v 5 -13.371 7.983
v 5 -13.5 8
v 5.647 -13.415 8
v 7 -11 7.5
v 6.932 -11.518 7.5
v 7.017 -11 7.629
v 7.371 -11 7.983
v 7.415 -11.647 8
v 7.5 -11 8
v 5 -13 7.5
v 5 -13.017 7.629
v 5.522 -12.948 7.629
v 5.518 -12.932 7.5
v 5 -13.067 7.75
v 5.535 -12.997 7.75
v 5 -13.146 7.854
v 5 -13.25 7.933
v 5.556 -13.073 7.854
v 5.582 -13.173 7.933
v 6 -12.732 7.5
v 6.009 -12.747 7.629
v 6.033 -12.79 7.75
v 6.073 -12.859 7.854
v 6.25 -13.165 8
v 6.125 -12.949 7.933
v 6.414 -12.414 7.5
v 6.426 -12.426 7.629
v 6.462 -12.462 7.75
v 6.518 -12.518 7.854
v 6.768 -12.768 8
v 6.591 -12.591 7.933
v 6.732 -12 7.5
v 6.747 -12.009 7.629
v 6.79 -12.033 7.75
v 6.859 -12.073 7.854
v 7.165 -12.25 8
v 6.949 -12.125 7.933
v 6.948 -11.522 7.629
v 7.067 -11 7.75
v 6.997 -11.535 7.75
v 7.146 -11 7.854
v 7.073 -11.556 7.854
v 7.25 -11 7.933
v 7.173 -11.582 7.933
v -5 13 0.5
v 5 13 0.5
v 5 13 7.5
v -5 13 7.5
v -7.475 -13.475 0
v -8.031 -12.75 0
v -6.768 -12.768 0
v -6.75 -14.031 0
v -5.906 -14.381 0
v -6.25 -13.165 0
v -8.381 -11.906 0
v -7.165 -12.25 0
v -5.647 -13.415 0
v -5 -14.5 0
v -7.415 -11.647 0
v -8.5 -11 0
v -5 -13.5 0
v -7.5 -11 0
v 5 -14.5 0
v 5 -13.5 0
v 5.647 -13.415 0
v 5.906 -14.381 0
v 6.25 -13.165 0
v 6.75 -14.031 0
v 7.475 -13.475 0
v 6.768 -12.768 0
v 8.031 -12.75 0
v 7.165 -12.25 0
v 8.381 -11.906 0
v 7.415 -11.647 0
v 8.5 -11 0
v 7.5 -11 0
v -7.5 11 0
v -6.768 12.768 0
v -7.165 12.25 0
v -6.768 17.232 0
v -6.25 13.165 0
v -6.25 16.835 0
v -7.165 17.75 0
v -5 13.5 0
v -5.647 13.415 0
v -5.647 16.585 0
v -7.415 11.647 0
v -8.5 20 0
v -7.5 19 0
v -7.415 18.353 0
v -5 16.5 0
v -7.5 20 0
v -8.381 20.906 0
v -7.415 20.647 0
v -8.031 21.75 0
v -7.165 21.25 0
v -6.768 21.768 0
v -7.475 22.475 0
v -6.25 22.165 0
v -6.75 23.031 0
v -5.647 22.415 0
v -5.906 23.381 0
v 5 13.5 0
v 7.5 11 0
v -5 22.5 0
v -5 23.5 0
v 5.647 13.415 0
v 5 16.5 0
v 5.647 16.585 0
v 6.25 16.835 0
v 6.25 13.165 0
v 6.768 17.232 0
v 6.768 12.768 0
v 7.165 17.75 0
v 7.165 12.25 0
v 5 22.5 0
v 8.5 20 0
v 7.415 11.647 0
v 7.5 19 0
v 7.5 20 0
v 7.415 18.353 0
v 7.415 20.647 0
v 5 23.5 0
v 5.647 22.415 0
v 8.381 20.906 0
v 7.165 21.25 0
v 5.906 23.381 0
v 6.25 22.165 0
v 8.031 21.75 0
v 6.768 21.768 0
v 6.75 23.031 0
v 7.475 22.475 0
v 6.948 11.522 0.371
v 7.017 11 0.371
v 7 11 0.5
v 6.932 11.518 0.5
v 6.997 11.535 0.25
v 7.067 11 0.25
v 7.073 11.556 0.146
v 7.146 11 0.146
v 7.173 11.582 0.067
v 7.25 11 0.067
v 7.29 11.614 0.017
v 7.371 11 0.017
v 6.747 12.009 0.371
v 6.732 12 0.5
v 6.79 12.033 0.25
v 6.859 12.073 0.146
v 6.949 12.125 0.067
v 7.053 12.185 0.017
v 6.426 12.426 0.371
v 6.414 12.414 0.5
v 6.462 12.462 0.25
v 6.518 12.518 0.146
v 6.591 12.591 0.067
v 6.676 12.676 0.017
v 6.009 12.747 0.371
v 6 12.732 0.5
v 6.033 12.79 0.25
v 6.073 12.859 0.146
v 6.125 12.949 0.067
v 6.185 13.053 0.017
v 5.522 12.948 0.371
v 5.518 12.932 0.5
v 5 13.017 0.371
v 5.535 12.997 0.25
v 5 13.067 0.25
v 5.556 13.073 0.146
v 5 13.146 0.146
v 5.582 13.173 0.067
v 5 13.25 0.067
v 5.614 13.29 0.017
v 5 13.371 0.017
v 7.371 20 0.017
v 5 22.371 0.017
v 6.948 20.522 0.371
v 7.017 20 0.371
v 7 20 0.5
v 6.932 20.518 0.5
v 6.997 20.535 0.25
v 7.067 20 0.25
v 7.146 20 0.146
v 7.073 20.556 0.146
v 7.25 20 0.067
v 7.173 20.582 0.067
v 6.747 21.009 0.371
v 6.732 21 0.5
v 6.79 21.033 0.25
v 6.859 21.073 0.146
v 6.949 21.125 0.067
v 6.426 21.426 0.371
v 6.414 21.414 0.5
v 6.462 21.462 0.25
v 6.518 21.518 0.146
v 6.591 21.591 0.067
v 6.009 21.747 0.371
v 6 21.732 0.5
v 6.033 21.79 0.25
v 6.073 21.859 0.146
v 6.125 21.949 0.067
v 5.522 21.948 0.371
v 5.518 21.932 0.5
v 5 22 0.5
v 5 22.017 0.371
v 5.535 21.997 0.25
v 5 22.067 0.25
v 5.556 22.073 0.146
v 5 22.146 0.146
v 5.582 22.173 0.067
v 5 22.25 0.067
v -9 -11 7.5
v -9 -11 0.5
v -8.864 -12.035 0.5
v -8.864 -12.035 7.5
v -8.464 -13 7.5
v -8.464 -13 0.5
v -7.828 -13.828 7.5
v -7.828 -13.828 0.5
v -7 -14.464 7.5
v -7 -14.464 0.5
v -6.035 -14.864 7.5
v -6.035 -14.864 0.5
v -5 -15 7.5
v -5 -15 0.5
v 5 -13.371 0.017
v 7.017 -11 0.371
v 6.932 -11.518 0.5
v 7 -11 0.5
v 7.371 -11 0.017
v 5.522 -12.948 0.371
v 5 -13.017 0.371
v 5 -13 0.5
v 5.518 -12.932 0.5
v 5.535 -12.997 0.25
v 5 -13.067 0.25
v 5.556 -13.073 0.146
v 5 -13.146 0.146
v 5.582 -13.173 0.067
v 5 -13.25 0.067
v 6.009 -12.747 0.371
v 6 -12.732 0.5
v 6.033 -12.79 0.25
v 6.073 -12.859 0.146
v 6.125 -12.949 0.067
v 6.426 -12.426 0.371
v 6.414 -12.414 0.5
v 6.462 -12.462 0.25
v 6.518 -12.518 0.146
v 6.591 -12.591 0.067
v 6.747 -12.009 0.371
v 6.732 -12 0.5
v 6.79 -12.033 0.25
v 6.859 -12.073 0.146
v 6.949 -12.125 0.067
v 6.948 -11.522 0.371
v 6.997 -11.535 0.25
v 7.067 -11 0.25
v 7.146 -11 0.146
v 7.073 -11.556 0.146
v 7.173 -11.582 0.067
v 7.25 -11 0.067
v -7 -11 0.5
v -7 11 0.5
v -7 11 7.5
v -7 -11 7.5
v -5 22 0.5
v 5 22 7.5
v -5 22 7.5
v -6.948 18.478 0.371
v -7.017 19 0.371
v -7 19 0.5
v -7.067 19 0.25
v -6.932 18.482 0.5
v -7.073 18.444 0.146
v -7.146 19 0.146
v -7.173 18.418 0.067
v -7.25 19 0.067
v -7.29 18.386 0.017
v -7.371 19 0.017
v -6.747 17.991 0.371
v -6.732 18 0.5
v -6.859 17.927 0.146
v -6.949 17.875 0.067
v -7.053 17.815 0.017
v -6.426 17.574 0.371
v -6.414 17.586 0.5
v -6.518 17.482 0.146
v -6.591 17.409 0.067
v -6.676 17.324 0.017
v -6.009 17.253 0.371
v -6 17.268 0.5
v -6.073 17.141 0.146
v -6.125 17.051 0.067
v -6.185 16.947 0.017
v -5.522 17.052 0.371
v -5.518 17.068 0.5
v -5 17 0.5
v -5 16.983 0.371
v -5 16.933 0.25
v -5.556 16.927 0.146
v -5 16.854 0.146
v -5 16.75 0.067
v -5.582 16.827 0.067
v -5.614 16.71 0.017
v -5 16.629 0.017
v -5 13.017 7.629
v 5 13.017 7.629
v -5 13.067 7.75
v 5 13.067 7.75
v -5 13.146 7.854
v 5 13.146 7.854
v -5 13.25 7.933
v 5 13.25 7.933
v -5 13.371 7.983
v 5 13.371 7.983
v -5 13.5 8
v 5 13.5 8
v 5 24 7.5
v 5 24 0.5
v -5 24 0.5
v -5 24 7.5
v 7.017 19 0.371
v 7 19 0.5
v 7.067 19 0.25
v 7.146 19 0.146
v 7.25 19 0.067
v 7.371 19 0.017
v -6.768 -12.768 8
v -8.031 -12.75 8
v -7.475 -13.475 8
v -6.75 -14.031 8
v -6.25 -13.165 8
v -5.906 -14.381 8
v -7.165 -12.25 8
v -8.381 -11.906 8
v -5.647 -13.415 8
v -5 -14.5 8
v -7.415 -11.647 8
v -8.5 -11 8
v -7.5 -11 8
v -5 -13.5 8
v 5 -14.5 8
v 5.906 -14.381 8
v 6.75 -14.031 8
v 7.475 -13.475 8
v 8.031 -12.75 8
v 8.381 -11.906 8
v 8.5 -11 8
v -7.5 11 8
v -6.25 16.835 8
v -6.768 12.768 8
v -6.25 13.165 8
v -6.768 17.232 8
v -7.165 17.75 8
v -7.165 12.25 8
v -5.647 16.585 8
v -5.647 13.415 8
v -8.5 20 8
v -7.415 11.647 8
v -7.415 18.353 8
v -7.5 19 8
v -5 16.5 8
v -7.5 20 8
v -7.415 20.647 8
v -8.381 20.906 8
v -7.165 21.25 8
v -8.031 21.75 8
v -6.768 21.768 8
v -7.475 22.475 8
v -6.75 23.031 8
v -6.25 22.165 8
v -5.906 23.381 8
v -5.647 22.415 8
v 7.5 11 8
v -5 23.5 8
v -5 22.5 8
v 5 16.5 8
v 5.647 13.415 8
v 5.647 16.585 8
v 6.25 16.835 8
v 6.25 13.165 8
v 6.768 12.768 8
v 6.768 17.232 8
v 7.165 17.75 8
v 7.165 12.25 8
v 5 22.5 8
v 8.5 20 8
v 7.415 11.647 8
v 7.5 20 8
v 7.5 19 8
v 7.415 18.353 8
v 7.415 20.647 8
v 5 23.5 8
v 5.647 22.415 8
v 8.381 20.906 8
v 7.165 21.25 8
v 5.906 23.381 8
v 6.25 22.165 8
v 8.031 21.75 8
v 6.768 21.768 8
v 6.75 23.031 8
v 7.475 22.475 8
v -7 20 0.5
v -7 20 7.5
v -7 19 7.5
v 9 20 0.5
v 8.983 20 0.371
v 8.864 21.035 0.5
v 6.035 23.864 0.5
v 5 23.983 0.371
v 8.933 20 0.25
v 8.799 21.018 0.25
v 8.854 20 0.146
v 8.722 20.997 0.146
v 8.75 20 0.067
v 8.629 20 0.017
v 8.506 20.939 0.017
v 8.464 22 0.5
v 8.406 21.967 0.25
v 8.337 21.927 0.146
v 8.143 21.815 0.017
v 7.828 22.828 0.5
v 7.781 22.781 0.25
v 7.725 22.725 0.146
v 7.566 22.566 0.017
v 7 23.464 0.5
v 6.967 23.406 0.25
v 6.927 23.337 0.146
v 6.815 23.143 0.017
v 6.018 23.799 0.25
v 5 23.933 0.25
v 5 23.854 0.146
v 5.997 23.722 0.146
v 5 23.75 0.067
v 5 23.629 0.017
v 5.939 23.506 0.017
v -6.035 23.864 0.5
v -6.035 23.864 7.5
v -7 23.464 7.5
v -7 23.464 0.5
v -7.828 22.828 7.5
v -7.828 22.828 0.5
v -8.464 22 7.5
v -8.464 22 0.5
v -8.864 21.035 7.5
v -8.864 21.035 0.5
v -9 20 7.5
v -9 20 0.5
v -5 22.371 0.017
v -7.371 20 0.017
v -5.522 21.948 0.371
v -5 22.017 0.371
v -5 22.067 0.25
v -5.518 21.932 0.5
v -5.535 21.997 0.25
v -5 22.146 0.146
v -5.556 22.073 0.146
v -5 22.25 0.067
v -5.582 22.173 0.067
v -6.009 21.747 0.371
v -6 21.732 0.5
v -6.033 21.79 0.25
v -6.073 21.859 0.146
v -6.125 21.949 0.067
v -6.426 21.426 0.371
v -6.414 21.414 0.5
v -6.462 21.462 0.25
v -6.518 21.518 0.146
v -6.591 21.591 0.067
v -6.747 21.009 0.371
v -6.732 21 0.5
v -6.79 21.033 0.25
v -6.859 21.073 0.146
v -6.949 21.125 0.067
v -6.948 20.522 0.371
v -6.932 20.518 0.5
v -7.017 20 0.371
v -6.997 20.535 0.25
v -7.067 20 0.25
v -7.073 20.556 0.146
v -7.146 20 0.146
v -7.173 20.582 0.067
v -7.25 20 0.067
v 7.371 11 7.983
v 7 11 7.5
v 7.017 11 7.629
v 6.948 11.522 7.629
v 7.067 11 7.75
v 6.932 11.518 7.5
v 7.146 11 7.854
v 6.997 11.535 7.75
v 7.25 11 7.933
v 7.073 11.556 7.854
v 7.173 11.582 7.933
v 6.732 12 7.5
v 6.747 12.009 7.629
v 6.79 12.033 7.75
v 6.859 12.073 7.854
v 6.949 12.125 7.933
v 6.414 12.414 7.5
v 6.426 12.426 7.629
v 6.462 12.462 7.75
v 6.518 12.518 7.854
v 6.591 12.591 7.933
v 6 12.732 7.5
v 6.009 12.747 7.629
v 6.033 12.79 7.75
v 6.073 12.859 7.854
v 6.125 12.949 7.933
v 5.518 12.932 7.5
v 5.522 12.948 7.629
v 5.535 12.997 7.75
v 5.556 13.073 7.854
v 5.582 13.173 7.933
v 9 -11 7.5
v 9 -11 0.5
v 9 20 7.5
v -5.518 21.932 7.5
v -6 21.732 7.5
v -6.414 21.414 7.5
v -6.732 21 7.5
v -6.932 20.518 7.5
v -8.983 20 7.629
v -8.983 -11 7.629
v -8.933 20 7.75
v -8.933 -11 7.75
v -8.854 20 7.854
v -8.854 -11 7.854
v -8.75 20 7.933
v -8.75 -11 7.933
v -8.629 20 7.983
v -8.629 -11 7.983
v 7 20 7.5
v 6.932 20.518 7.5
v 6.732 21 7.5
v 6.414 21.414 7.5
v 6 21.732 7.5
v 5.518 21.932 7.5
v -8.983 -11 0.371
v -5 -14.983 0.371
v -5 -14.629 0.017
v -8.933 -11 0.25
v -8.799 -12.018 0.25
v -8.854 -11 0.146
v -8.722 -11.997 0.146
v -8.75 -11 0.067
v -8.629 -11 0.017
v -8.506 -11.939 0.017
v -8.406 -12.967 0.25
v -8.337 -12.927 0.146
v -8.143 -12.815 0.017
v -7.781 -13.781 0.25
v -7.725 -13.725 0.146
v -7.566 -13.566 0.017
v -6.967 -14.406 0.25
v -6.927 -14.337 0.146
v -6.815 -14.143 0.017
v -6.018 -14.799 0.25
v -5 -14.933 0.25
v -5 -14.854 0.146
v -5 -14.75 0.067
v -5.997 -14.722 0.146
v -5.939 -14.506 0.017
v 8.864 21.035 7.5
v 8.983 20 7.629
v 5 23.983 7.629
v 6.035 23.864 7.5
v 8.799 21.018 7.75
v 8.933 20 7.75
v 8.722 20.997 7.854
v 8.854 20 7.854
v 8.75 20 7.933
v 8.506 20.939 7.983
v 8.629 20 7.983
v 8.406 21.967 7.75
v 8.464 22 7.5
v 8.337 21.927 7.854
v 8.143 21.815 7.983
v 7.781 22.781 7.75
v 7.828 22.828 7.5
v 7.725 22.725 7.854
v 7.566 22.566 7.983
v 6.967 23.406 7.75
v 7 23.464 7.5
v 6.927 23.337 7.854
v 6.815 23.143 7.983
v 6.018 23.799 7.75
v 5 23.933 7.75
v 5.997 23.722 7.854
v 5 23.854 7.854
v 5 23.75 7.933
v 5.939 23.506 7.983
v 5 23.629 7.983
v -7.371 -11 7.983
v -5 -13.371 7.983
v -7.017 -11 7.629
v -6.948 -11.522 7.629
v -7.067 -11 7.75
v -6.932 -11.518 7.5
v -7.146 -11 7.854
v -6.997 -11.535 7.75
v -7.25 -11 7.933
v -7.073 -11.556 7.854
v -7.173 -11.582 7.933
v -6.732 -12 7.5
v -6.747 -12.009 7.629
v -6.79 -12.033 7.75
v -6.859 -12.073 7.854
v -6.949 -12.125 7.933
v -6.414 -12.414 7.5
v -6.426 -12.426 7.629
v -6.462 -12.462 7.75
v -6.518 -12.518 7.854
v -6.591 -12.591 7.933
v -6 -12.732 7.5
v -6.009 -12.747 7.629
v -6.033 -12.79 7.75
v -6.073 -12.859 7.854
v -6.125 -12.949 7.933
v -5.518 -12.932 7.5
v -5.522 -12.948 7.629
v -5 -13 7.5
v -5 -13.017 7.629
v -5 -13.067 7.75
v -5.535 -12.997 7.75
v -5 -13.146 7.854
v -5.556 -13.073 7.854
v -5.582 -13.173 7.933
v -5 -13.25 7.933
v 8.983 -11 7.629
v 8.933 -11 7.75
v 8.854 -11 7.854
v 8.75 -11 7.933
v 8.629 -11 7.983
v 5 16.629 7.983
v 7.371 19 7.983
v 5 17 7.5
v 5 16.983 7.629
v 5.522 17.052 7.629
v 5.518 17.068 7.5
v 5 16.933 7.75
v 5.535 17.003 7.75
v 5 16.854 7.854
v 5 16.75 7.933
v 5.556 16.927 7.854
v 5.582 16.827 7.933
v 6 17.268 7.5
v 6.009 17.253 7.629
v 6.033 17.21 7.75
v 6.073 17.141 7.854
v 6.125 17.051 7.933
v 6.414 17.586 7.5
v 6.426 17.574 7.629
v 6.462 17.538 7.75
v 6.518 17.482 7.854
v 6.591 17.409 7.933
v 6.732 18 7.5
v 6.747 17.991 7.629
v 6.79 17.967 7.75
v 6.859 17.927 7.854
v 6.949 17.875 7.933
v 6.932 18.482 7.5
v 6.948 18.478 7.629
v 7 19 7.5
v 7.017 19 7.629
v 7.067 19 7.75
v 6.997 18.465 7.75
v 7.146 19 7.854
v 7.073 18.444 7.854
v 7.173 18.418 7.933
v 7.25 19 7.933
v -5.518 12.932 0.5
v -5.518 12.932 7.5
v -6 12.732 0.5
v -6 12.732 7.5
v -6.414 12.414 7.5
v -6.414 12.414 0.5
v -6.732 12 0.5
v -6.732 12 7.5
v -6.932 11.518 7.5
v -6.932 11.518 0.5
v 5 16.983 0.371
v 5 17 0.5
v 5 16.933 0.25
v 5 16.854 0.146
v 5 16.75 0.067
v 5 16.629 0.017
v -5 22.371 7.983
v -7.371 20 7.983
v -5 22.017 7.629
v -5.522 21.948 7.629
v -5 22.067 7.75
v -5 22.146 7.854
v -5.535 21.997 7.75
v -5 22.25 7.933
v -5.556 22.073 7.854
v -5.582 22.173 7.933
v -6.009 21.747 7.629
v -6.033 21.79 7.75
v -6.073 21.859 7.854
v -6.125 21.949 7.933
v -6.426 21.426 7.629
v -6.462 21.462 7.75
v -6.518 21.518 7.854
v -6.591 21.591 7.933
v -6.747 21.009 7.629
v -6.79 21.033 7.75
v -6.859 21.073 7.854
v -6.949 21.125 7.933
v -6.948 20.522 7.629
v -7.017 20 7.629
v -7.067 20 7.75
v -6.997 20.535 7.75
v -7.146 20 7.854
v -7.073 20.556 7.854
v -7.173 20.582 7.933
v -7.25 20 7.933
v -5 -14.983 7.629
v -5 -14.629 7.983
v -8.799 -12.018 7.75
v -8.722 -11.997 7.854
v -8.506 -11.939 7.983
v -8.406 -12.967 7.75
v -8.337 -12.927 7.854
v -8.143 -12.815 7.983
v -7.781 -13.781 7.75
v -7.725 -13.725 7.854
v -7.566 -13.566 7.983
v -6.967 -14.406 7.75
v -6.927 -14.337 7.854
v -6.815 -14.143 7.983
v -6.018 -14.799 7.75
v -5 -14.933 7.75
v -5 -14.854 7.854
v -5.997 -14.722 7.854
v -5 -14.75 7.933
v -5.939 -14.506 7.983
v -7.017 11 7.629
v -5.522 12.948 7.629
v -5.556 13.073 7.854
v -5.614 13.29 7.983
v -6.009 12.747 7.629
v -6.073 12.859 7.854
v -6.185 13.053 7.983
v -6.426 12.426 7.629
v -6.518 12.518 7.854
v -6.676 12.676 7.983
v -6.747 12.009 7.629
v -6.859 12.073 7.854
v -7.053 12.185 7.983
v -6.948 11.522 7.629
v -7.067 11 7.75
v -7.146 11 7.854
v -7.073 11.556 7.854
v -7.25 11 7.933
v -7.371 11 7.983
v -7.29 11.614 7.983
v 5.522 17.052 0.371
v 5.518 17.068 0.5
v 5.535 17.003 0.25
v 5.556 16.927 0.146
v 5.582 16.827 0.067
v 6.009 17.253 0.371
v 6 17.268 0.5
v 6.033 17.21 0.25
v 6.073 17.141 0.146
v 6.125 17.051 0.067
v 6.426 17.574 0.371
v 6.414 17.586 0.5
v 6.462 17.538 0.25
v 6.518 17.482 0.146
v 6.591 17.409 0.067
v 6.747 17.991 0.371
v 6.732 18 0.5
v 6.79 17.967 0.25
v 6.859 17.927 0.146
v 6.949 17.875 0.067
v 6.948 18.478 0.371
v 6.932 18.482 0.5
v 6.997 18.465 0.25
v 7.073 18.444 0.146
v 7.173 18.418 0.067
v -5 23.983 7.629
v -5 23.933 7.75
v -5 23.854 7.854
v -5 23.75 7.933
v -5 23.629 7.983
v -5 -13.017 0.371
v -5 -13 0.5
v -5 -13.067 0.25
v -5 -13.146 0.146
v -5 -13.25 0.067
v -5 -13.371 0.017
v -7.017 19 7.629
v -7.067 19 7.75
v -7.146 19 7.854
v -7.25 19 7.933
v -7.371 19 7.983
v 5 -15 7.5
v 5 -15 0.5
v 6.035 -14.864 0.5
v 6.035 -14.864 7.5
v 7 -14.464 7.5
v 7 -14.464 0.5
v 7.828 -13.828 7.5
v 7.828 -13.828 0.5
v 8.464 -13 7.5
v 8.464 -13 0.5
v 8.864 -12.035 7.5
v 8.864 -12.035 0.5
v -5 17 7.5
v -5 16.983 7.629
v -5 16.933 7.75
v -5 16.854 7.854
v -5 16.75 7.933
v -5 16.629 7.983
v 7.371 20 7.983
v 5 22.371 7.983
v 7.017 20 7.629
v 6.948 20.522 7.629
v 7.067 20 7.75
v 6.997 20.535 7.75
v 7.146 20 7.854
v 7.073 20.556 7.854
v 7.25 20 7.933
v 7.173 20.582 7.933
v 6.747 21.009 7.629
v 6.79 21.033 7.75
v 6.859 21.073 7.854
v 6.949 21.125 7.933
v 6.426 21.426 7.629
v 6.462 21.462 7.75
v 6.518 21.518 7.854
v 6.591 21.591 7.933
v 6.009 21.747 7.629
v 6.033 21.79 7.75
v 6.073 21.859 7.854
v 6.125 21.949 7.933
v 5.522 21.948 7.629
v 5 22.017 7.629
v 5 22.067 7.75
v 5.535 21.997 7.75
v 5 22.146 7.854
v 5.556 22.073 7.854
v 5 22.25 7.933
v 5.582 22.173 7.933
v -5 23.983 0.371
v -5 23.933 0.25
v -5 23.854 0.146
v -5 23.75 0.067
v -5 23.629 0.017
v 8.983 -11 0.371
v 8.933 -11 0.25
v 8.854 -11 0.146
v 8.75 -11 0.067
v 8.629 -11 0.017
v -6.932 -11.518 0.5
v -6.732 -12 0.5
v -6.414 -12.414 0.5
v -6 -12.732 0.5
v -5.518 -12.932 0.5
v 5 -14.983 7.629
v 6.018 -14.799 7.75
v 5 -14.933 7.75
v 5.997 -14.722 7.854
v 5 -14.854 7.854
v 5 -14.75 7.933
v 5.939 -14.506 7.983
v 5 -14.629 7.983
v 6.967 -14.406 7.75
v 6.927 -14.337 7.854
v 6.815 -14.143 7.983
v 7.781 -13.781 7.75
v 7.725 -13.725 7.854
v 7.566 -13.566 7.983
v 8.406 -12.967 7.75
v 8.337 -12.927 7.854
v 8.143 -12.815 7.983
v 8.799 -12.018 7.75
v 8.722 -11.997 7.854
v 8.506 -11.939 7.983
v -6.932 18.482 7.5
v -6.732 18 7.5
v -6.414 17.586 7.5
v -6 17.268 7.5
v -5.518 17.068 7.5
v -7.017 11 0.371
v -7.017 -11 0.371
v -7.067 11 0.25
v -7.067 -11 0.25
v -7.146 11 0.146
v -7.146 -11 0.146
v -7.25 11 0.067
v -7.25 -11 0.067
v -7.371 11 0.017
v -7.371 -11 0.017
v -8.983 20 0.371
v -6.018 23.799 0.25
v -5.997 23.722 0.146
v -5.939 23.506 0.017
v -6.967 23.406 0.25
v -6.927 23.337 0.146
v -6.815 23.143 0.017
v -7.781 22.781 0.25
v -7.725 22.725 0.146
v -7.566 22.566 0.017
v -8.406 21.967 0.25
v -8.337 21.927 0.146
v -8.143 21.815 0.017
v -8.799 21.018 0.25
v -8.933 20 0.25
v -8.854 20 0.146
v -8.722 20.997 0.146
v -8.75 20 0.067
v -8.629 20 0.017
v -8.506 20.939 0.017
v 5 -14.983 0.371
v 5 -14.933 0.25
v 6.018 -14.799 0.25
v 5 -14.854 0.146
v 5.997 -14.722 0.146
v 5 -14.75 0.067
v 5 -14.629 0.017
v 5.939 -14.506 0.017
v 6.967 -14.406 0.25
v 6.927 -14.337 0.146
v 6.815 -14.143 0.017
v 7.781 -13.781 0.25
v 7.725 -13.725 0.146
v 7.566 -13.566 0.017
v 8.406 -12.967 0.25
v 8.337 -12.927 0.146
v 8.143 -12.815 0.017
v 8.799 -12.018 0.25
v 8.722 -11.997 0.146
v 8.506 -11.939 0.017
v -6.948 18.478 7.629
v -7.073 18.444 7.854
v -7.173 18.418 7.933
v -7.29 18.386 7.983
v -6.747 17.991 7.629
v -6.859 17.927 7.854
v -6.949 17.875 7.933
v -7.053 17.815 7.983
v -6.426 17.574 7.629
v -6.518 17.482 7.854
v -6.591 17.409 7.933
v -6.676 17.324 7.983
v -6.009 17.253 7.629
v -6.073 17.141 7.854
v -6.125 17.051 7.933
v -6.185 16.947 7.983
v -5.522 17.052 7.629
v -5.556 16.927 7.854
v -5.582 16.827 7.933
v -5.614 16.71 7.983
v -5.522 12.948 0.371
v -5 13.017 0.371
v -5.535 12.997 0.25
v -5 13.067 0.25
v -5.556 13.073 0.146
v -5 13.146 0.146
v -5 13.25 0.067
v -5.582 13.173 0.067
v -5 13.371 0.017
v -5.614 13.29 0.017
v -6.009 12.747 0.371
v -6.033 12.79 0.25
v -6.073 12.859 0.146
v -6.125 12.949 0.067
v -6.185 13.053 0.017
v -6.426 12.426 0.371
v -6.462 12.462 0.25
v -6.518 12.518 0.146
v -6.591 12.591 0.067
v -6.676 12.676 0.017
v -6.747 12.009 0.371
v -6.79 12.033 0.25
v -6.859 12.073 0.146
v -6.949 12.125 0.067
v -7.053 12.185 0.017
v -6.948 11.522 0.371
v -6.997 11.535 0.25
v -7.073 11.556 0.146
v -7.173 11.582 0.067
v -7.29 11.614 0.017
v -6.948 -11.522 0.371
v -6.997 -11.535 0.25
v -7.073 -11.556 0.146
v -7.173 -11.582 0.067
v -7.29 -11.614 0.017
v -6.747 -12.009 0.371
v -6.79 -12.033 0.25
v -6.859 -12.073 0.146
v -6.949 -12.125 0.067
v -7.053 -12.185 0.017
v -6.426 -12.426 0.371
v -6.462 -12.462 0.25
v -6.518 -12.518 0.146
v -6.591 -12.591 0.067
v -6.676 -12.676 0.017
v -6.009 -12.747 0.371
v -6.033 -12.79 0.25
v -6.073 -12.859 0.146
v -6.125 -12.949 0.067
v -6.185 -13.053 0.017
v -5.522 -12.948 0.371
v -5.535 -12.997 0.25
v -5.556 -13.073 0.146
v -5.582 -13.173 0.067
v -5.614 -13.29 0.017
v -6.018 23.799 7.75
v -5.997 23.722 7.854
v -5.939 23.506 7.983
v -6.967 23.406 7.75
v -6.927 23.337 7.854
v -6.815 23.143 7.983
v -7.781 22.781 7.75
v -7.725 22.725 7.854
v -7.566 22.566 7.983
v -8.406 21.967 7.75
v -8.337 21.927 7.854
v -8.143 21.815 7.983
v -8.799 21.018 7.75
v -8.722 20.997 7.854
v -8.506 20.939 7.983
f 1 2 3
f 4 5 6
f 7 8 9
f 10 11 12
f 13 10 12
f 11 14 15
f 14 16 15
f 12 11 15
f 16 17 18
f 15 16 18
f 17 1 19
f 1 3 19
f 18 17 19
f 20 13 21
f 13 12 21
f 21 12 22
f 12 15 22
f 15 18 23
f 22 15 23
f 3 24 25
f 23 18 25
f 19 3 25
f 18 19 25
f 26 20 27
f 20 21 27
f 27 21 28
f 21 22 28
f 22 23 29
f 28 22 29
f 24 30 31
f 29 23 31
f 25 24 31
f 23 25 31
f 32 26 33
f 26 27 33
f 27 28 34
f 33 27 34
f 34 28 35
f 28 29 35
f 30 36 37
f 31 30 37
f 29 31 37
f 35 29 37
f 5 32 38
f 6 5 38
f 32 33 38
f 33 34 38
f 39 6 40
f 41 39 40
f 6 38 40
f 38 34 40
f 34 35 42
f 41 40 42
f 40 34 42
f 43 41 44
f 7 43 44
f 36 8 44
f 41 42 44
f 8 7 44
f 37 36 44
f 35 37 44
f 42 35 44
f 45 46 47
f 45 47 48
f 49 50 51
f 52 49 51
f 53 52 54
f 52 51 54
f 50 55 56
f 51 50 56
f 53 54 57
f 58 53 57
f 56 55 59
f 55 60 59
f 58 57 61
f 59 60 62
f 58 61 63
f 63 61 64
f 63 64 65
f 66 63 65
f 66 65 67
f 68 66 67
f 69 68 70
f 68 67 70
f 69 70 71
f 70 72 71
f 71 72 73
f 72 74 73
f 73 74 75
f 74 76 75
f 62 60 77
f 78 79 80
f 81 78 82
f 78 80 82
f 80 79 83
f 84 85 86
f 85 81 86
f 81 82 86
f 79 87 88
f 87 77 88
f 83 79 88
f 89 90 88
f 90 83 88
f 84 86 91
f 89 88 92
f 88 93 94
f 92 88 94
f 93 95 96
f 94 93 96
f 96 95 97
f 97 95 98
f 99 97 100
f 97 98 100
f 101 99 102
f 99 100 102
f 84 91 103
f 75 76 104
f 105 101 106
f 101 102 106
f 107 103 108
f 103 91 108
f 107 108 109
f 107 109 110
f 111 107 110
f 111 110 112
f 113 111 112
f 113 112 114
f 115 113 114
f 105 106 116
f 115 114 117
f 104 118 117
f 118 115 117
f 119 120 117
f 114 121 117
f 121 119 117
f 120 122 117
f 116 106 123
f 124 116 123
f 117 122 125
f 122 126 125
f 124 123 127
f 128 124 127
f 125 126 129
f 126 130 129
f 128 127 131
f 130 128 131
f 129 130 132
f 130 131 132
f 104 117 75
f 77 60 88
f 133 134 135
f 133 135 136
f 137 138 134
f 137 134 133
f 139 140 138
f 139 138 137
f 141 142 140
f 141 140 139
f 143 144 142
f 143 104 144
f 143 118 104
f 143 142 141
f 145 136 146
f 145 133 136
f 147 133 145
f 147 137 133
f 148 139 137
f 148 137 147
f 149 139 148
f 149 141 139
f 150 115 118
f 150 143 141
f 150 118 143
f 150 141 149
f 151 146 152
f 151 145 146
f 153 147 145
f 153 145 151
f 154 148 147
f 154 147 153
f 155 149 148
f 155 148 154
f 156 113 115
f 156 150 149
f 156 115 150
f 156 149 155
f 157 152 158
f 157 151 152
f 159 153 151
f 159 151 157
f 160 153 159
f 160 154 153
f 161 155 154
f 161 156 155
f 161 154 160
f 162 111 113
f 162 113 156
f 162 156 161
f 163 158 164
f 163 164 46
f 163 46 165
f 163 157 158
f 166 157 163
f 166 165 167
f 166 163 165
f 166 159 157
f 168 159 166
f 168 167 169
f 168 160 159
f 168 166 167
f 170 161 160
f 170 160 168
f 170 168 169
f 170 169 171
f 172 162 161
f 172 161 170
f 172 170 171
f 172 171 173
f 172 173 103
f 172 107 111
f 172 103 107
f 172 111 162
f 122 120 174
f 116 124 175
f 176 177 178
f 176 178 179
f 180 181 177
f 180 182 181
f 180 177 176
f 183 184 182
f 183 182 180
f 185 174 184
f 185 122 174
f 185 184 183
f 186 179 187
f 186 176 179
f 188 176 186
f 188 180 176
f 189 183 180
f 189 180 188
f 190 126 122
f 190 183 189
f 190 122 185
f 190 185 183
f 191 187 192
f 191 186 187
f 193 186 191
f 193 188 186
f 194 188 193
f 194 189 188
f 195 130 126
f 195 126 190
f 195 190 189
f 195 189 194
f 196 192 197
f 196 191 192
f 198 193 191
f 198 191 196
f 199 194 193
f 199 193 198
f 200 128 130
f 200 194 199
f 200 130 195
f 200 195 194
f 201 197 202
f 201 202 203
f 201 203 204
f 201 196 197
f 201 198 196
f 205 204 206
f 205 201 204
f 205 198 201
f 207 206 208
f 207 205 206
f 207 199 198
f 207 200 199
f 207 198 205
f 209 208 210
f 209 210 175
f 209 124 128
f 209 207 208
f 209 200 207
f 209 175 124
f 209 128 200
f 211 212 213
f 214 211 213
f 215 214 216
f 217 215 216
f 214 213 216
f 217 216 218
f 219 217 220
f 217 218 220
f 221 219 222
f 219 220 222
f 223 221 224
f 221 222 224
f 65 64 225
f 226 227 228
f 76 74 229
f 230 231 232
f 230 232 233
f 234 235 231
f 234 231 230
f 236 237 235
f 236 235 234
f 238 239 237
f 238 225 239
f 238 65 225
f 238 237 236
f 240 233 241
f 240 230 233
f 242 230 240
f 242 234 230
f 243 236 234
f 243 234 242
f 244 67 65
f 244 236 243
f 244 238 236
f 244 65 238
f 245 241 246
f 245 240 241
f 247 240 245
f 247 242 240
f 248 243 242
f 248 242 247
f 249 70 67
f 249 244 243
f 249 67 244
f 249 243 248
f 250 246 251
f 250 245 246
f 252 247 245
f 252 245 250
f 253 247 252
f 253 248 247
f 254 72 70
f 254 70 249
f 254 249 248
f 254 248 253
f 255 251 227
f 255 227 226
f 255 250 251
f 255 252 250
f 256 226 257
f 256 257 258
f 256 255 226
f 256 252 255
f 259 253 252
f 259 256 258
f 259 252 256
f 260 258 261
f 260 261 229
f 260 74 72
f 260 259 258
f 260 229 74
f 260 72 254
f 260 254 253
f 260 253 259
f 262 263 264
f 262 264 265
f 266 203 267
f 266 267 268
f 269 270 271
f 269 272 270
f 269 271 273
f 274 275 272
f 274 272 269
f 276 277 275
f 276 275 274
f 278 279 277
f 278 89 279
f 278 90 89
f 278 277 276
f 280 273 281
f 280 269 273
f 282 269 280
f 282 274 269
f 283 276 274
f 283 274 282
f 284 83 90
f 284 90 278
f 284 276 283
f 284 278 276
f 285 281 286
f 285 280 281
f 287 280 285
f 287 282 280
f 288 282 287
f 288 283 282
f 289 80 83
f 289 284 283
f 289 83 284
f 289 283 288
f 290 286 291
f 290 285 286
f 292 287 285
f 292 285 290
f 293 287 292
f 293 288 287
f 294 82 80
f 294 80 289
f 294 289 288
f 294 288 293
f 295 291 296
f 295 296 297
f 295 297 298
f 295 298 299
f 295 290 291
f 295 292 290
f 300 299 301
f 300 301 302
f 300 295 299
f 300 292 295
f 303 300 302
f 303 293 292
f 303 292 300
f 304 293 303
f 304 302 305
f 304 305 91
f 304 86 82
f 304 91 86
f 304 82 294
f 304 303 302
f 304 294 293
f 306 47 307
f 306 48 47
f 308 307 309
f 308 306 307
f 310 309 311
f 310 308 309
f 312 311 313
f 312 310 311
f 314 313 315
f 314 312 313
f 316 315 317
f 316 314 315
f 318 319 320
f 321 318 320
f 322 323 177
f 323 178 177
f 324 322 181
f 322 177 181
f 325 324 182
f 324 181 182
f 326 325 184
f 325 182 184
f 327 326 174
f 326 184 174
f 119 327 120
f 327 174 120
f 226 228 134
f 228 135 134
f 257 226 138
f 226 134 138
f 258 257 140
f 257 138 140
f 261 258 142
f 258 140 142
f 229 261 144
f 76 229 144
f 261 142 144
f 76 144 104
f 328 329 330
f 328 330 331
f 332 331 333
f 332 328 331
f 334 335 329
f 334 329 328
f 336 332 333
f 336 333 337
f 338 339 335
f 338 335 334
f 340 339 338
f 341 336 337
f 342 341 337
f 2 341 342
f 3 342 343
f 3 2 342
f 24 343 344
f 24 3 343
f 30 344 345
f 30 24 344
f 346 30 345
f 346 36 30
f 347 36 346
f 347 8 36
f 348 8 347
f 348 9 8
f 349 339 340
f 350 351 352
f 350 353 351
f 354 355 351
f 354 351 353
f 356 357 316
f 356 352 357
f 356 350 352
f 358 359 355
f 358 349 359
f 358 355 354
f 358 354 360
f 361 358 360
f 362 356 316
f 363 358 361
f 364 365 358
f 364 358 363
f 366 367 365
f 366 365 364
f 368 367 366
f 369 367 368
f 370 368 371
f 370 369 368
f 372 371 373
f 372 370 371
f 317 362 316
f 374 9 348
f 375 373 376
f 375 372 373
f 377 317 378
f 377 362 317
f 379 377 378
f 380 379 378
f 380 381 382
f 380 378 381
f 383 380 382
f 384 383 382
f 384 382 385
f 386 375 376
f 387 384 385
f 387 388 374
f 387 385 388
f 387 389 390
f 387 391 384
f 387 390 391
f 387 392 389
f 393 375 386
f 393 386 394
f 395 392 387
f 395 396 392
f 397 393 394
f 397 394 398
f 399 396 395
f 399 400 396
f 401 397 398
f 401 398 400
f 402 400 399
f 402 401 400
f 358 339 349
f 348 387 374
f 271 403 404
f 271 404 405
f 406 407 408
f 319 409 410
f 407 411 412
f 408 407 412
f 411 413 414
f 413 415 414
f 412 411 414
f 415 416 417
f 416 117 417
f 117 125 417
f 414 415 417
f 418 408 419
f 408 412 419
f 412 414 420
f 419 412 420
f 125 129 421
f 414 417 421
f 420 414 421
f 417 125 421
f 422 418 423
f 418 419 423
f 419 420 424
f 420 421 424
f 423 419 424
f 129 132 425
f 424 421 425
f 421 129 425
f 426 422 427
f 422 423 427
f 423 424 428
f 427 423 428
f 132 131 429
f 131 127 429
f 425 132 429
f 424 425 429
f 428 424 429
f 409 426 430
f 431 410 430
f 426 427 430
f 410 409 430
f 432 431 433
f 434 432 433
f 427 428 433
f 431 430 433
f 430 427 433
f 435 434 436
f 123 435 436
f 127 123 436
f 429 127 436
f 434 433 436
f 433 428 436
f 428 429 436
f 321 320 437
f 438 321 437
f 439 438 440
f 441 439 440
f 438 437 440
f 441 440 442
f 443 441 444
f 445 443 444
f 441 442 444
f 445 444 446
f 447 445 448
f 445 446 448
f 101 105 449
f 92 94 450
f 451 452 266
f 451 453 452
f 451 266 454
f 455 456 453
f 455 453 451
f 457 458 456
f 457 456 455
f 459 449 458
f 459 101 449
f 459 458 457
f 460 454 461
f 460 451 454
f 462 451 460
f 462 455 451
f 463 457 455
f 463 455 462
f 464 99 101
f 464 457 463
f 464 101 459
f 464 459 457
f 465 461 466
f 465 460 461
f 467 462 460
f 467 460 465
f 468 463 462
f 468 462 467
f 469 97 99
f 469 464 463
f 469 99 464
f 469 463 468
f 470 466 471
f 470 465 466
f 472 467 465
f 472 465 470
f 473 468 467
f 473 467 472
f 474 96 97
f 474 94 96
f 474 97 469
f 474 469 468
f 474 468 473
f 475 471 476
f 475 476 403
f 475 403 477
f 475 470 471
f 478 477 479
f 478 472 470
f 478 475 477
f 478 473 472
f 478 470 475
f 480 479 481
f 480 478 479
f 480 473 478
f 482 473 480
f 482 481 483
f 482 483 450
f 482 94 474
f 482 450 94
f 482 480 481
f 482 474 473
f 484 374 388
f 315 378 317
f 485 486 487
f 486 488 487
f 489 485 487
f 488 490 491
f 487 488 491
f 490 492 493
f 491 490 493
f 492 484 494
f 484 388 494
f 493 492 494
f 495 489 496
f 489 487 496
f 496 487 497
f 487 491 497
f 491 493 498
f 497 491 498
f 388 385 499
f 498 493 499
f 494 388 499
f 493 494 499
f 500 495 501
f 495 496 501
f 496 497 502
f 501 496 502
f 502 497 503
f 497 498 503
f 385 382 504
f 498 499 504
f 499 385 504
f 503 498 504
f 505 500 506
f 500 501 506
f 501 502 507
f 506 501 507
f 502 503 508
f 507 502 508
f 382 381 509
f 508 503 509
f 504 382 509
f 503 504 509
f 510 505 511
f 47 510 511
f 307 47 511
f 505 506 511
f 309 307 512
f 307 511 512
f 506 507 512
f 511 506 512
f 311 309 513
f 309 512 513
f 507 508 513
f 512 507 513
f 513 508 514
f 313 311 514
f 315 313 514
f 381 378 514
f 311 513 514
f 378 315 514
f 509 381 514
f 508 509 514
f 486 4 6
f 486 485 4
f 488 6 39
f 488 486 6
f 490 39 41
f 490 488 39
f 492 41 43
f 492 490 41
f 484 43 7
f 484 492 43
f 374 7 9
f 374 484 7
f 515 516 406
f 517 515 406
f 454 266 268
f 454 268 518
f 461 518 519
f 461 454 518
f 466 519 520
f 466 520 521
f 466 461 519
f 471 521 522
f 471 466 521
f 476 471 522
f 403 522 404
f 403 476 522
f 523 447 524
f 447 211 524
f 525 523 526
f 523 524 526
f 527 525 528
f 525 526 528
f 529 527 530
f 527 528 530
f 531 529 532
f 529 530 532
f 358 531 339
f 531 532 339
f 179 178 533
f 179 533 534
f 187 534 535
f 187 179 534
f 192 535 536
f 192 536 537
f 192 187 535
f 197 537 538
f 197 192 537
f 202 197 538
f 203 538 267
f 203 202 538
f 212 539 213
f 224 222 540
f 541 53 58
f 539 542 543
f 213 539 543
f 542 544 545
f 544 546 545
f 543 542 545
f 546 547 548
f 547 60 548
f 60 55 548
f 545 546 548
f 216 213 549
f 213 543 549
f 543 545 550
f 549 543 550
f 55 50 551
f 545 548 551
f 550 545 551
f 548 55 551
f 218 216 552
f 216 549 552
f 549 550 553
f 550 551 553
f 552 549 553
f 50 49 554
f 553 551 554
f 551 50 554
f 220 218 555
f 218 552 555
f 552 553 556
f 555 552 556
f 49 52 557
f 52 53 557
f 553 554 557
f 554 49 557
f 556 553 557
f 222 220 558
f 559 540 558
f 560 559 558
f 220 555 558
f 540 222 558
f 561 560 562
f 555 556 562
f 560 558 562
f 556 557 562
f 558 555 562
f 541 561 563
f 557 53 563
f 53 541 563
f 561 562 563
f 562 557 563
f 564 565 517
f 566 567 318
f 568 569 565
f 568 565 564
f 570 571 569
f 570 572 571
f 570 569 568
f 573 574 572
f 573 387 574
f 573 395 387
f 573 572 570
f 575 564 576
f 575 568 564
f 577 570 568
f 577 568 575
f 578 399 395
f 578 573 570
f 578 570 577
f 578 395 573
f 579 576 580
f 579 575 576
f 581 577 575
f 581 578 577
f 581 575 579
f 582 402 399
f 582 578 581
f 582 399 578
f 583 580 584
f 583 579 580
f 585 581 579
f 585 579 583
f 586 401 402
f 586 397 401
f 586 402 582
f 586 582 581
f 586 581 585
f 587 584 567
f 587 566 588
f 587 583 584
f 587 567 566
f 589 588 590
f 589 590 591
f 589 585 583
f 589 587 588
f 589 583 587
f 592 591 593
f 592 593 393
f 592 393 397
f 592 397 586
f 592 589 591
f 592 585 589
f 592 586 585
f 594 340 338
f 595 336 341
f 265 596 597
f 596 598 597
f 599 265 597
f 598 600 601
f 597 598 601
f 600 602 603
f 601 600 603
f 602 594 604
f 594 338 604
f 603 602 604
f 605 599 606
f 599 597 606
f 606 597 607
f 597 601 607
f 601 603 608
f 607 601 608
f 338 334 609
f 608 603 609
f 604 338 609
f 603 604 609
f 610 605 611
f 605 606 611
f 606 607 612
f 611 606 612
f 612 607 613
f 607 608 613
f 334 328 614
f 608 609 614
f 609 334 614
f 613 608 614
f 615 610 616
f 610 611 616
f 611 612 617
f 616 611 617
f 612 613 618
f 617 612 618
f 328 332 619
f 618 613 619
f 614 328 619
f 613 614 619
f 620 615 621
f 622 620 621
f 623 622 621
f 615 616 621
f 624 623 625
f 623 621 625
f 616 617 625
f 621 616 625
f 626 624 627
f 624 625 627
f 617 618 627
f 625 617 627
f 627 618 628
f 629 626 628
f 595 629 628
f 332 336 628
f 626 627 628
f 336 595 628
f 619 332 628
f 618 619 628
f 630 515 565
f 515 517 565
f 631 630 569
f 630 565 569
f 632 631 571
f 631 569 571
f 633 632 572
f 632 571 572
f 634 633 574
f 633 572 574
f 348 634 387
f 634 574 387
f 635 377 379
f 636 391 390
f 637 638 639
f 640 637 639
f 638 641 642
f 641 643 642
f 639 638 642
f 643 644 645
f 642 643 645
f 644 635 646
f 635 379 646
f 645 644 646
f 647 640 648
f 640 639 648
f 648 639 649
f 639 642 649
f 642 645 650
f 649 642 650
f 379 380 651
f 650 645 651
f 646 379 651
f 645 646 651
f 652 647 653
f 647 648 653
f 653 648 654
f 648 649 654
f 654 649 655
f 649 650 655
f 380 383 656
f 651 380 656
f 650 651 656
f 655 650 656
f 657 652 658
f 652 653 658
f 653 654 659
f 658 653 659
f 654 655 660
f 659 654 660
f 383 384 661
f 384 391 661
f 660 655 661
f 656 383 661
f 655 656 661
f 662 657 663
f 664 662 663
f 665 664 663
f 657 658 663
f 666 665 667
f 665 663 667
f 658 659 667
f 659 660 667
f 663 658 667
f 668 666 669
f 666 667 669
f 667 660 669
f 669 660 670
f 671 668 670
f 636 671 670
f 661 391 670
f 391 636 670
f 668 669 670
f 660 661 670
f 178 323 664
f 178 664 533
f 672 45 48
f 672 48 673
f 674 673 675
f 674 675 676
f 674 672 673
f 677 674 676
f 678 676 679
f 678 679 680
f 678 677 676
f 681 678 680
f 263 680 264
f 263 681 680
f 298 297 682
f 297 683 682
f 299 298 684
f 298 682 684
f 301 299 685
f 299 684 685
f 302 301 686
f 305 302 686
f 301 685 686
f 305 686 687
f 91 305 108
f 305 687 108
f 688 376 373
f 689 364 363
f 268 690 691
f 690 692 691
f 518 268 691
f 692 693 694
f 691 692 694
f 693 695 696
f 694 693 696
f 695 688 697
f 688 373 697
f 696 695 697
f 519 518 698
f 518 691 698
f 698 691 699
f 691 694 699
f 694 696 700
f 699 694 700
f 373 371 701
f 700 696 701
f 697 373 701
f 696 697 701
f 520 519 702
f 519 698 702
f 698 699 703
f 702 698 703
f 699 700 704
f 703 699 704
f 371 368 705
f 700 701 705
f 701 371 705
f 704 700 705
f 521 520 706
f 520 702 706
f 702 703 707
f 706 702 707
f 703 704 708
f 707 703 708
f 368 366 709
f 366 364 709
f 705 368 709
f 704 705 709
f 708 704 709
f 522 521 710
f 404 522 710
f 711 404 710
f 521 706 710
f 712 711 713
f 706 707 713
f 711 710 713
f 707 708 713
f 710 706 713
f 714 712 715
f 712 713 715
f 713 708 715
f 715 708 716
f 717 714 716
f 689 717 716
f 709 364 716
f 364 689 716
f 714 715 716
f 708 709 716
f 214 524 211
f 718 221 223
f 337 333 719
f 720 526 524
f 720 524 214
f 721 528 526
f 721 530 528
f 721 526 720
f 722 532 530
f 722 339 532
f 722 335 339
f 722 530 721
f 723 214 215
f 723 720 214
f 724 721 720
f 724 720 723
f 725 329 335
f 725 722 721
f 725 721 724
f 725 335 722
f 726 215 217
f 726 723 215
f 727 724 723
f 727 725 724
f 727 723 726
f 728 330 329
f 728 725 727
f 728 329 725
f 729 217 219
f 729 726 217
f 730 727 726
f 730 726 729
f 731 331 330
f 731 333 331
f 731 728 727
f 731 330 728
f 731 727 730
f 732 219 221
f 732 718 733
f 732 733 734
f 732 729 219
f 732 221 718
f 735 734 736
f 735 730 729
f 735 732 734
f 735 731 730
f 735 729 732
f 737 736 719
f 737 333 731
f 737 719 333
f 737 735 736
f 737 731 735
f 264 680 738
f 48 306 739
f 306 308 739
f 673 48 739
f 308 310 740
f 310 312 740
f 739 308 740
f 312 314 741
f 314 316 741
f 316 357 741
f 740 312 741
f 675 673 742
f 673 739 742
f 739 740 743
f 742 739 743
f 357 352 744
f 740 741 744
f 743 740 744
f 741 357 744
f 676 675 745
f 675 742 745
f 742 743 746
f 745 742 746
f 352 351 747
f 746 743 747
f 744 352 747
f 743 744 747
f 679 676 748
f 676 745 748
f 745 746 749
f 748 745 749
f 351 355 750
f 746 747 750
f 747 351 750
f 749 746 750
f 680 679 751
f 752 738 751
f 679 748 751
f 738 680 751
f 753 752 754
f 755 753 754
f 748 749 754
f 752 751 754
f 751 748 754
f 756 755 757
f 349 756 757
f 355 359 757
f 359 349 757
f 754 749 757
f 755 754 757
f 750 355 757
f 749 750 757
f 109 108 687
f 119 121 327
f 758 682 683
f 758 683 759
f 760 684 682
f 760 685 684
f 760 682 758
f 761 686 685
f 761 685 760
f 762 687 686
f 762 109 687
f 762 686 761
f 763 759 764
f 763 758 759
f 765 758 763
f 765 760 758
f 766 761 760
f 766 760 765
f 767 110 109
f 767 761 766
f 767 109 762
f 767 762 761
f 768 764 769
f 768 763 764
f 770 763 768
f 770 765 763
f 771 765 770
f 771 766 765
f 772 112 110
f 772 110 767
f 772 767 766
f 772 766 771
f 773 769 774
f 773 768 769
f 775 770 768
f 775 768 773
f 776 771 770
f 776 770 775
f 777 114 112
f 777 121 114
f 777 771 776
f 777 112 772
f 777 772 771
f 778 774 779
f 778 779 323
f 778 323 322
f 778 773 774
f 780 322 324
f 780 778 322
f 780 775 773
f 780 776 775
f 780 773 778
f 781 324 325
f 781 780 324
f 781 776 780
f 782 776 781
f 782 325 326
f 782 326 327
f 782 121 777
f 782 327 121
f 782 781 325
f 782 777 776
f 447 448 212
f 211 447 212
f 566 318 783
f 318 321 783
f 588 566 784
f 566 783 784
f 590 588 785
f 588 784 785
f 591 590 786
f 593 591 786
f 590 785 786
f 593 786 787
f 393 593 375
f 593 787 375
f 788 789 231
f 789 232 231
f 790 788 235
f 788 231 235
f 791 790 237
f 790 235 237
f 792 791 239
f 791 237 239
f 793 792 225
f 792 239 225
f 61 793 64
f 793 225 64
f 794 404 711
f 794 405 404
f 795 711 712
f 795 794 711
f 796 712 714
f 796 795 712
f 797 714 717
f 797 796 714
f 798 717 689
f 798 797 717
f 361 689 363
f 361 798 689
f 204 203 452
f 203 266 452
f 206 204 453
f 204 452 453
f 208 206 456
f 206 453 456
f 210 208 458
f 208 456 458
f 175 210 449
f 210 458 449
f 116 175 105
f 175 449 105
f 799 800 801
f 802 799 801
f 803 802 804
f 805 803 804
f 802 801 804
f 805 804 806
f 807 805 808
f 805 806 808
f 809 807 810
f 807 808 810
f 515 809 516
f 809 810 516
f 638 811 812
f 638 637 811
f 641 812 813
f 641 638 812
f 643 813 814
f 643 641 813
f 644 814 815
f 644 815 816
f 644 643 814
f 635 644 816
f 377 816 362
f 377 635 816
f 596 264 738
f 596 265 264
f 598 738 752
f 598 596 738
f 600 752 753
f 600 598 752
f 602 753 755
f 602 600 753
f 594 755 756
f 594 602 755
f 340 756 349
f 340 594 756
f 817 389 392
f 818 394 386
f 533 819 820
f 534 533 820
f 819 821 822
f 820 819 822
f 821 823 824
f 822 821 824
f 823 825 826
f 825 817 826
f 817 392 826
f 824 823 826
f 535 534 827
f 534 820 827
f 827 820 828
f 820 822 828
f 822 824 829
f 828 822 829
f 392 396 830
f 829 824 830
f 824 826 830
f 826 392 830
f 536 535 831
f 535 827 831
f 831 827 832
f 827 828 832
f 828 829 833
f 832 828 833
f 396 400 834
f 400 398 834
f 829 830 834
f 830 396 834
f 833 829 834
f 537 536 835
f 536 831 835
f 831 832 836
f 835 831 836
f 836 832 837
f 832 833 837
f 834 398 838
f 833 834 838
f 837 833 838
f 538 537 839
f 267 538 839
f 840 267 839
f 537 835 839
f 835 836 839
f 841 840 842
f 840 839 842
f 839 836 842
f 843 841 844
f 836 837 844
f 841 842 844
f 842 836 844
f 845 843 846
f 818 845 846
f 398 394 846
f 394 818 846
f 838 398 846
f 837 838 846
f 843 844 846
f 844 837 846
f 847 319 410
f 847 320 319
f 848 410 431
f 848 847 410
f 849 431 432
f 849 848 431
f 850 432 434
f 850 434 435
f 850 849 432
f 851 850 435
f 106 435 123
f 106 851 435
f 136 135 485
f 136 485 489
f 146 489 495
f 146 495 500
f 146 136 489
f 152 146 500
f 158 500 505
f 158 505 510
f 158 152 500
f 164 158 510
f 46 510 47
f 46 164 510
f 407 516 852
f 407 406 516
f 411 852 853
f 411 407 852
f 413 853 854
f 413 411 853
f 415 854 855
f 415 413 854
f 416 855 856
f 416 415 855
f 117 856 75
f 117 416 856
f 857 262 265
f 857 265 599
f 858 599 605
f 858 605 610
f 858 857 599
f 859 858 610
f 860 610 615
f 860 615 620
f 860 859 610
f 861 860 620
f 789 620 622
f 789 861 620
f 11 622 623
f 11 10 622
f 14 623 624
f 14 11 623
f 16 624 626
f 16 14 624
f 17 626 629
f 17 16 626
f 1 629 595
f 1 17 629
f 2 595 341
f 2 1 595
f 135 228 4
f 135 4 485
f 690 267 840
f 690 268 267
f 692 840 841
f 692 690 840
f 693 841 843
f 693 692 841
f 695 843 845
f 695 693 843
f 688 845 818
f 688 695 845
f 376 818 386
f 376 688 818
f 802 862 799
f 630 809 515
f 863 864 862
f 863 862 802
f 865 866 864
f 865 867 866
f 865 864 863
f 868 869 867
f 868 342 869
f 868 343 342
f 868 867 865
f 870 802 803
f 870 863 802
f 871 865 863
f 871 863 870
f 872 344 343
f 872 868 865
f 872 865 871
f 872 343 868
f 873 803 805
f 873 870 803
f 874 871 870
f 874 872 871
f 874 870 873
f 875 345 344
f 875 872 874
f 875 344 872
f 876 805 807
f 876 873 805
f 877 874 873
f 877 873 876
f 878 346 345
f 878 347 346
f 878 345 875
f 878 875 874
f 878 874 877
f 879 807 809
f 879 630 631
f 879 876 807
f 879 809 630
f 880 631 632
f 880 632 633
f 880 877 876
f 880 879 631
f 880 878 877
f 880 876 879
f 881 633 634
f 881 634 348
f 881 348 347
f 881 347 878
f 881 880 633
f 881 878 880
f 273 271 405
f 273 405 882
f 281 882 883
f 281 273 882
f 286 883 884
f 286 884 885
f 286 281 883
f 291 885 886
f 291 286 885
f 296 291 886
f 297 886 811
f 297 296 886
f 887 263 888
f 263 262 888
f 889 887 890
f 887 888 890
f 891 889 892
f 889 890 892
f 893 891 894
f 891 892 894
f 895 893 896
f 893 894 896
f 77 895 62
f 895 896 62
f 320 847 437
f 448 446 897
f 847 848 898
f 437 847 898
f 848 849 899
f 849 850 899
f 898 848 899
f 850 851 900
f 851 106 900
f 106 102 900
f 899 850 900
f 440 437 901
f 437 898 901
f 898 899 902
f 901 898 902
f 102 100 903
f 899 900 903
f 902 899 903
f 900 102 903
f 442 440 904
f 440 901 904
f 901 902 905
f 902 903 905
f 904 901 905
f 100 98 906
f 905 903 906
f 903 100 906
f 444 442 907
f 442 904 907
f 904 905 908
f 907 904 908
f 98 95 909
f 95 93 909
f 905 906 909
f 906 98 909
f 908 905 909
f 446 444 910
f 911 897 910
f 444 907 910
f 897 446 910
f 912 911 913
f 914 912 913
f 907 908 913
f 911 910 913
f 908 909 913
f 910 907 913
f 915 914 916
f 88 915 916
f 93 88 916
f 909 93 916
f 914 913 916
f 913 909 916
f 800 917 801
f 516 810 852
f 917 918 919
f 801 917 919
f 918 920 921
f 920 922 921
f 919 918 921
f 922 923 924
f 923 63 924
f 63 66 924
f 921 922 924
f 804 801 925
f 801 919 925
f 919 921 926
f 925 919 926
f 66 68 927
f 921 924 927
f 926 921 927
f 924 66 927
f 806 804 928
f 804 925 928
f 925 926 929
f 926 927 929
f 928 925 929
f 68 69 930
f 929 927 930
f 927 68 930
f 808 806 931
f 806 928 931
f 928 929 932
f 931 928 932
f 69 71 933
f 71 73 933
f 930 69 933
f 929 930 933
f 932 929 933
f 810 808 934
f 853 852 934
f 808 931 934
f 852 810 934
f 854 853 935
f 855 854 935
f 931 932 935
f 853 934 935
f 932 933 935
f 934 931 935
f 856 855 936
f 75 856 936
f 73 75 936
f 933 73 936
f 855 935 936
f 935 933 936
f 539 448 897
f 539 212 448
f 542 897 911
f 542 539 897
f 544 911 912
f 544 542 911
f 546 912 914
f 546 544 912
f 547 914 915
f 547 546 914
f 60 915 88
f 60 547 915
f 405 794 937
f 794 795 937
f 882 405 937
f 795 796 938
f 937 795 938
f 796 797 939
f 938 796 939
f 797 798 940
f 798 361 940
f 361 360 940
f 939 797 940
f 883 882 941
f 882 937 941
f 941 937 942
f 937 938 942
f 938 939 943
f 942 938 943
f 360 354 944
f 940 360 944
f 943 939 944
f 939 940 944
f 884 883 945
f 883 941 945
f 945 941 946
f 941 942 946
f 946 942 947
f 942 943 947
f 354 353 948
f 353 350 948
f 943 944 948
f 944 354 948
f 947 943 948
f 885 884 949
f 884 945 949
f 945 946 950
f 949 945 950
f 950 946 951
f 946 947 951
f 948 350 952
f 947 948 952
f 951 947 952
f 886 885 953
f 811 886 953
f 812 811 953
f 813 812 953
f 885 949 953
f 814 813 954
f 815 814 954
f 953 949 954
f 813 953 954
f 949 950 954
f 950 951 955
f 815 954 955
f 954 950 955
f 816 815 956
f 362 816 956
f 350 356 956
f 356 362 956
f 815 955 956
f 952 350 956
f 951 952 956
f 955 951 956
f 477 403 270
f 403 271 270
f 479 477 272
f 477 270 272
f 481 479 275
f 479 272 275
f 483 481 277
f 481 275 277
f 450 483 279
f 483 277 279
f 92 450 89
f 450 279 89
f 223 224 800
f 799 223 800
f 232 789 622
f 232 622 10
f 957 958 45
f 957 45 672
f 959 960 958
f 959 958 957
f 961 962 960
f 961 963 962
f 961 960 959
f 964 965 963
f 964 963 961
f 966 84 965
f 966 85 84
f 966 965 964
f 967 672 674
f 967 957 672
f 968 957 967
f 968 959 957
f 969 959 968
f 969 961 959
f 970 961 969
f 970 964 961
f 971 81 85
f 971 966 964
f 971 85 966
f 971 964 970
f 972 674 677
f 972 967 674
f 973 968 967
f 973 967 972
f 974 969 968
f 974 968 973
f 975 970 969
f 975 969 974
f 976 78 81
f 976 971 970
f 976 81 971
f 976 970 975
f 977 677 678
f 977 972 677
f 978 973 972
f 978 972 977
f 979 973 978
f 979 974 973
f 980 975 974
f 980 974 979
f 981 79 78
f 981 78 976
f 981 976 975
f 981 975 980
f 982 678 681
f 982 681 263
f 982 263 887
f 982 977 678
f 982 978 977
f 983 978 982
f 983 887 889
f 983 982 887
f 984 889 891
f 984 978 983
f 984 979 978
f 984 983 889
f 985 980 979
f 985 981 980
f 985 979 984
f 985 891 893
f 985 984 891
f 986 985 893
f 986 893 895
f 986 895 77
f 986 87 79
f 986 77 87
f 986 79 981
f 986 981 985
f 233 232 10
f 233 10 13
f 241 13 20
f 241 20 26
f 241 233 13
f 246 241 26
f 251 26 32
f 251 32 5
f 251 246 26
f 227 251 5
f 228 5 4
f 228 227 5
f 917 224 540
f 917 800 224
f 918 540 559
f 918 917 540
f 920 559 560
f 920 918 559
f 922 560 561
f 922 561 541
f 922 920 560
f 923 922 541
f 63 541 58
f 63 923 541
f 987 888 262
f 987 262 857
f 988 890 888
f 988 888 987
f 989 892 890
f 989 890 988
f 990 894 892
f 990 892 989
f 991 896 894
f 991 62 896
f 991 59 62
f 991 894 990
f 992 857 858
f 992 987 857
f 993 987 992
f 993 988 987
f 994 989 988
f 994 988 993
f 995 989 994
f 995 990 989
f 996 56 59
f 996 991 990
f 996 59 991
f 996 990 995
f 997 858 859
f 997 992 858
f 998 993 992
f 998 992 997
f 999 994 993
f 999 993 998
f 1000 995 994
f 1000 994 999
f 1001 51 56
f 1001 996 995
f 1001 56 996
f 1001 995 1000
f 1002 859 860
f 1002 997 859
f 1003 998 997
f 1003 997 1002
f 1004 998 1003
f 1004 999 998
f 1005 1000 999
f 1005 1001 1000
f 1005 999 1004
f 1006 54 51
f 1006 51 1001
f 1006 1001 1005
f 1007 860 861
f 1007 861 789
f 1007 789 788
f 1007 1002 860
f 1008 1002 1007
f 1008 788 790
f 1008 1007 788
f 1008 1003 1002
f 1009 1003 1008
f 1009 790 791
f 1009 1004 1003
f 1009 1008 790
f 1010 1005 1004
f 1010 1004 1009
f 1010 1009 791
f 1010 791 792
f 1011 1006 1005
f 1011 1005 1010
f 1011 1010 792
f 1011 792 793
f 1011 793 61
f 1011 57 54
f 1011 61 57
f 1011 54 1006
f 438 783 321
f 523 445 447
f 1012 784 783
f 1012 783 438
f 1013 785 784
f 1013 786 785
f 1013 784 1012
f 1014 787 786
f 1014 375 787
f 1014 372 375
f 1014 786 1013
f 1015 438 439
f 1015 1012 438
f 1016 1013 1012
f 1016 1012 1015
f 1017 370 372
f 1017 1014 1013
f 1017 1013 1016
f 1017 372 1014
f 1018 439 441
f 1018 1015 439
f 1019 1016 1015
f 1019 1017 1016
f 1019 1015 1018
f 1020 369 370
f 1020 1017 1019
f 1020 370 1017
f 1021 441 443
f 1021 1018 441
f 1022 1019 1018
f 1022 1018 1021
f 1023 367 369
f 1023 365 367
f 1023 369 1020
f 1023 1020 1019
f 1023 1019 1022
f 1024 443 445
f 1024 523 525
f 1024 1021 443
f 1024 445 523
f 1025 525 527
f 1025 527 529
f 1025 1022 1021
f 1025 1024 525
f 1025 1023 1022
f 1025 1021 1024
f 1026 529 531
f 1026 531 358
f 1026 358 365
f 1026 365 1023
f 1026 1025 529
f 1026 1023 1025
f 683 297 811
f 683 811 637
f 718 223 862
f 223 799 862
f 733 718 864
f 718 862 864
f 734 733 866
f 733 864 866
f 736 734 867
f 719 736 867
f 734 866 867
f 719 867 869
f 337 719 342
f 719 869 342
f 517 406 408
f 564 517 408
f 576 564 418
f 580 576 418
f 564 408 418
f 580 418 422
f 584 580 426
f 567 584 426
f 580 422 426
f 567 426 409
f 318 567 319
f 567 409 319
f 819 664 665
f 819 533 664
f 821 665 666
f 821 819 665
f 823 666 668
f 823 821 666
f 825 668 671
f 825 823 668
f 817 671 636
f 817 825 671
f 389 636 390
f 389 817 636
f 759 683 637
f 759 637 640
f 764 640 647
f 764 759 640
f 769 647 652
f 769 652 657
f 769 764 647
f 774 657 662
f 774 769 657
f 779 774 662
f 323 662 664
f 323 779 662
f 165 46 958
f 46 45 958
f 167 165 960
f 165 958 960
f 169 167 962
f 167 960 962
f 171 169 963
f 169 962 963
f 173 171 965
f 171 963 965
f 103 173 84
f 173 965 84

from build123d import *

# Parameters (mm, degrees)
PAD_DEPTH = 8
FILLET_R  = 0.5


with BuildPart() as part:
    # Sketch → Pad (new body)
    with BuildSketch(Plane.XY):
        with BuildLine():
            Line((9, -11), (9, 20))
            ThreePointArc((9, 20), (7.828427, 22.828427), (5, 24))
            Line((5, 24), (-5, 24))
            ThreePointArc((-5, 24), (-7.828427, 22.828427), (-9, 20))
            Line((-9, 20), (-9, -11))
            ThreePointArc((-9, -11), (-7.828427, -13.828427), (-5, -15))
            Line((-5, -15), (5, -15))
            ThreePointArc((5, -15), (7.828427, -13.828427), (9, -11))
        make_face()
        with BuildLine():
            Line((-7, 11), (-7, -11))
            ThreePointArc((-7, -11), (-6.414214, -12.414214), (-5, -13))
            Line((-5, -13), (5, -13))
            ThreePointArc((5, -13), (6.414214, -12.414214), (7, -11))
            Line((7, -11), (7, 11))
            ThreePointArc((7, 11), (6.414214, 12.414214), (5, 13))
            Line((5, 13), (-5, 13))
            ThreePointArc((-5, 13), (-6.414214, 12.414214), (-7, 11))
        make_face(mode=Mode.SUBTRACT)
        with BuildLine():
            Line((-7, 20), (-7, 19))
            ThreePointArc((-7, 19), (-6.414214, 17.585786), (-5, 17))
            Line((-5, 17), (5, 17))
            ThreePointArc((5, 17), (6.414214, 17.585786), (7, 19))
            Line((7, 19), (7, 20))
            ThreePointArc((7, 20), (6.414214, 21.414214), (5, 22))
            Line((5, 22), (-5, 22))
            ThreePointArc((-5, 22), (-6.414214, 21.414214), (-7, 20))
        make_face(mode=Mode.SUBTRACT)
    extrude(amount=PAD_DEPTH)

    # Fillet
    fillet_edges = [part.edges().sort_by_distance(p)[0] for p in [
        (-7, 0, 8),
        (0, 17, 8),
        (-9, 4.5, 8),
        (-7, 0, 0),
        (0, 17, 0),
        (9, 4.5, 0),
    ]]
    fillet(fillet_edges, radius=FILLET_R)


solid = part.part
